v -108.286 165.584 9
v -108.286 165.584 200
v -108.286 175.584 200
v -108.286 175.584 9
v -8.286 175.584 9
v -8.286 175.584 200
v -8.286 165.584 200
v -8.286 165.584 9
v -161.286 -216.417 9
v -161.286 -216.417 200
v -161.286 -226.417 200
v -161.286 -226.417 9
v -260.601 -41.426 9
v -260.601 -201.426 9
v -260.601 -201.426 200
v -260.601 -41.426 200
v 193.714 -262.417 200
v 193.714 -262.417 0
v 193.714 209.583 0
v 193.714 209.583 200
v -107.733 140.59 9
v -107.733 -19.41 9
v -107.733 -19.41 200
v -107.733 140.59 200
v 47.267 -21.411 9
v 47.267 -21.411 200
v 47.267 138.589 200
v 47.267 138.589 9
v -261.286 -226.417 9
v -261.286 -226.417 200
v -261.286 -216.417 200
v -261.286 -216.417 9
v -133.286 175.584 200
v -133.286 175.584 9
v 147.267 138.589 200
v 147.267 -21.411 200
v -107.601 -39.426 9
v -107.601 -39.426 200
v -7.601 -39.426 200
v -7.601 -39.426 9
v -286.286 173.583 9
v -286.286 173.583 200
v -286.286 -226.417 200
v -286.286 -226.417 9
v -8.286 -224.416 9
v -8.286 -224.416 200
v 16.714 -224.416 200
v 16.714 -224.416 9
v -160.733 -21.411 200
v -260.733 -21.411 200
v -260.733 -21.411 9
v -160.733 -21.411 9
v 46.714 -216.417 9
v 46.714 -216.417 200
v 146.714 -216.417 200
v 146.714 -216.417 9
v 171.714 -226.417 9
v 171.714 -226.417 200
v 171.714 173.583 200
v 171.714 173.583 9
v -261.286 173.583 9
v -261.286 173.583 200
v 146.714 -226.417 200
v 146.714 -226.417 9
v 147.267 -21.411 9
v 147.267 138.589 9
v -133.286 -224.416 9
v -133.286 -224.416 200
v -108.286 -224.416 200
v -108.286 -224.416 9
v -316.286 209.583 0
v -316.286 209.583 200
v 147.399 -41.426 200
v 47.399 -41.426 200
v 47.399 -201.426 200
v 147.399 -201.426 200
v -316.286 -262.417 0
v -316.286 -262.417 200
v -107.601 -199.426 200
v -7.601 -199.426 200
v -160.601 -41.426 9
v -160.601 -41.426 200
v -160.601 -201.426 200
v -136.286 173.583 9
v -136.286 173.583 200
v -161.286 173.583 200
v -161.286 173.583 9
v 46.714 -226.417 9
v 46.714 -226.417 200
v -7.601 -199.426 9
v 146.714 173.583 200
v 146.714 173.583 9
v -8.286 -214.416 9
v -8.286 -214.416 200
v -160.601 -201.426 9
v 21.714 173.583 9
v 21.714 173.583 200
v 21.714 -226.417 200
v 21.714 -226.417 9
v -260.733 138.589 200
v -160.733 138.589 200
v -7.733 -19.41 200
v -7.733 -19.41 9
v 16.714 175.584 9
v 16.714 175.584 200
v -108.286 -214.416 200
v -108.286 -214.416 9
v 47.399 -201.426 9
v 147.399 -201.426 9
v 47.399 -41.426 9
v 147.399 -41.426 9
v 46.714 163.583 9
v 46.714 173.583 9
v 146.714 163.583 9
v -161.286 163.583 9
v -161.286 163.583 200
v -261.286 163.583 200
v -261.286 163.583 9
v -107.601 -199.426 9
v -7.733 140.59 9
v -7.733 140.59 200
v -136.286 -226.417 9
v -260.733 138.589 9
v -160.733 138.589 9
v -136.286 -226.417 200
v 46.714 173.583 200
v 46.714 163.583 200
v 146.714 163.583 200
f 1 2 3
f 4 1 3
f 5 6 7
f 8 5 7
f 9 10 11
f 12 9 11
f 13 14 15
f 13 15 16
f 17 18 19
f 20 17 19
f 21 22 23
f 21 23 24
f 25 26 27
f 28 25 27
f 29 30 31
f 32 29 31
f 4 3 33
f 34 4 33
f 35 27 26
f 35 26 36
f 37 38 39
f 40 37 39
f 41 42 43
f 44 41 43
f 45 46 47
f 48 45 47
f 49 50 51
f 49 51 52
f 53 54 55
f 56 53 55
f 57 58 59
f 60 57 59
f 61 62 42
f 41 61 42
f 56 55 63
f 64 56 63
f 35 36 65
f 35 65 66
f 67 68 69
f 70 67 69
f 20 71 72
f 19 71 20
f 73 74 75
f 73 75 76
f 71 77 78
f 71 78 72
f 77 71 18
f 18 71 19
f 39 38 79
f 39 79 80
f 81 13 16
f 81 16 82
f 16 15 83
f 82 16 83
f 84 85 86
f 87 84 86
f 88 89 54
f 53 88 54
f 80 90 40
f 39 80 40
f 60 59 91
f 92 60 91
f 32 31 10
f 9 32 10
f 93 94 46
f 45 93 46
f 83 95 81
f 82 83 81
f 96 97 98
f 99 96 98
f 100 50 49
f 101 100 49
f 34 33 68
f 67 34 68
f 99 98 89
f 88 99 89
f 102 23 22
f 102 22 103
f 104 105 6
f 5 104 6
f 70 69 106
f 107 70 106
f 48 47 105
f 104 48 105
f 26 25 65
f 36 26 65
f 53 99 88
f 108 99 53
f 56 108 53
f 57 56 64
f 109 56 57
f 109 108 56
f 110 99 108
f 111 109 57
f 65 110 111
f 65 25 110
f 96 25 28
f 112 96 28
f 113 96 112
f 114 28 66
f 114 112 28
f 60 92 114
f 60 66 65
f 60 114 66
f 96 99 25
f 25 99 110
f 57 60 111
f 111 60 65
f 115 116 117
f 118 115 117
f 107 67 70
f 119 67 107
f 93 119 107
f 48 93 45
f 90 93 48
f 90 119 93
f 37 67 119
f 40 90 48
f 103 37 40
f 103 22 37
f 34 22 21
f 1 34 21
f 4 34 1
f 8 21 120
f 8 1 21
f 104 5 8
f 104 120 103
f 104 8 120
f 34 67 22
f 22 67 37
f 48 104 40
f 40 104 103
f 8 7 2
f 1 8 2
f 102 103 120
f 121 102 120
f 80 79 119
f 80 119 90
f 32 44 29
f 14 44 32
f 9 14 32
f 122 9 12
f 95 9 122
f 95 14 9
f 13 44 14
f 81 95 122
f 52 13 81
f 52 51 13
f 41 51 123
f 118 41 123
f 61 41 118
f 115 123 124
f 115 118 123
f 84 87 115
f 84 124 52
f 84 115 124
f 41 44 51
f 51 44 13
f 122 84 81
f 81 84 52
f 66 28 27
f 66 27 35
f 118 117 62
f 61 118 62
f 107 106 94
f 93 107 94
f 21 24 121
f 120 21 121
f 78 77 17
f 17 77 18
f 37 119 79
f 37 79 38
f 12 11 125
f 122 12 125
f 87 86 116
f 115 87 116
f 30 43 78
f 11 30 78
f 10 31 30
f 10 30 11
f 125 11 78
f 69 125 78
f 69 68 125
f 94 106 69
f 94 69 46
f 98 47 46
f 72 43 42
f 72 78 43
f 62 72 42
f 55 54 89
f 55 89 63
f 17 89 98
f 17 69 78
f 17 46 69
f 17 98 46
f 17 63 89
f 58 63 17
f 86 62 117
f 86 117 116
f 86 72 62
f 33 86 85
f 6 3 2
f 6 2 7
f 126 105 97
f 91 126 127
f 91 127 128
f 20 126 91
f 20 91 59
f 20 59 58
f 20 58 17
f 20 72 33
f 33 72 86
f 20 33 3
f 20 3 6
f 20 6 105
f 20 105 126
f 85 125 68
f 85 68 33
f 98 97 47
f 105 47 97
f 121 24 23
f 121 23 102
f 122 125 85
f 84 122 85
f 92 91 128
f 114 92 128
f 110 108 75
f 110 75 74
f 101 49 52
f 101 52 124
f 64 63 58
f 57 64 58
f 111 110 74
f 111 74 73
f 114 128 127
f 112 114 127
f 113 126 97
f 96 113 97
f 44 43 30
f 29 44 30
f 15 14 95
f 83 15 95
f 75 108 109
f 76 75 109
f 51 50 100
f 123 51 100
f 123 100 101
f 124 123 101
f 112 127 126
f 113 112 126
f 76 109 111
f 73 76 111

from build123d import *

# Parameters (mm, degrees)
F0_W     = 510
F0_H     = 472
F1_DEPTH = 200
F2_W     = 100
F2_H     = 160
F3_DEPTH = 191
F4_W     = 100
F4_H     = 160
F5_DEPTH = 191
F6_W     = 100
F6_H     = 160
F7_DEPTH = 191


with BuildPart() as f1:
    # F0 (on Top) → F1 (new body)
    with BuildSketch(Plane.XY):
        with Locations((-61.286047, -26.417014)):
            Rectangle(F0_W, F0_H)
    extrude(amount=F1_DEPTH)

    # F2 (on face) → F3 (cut)
    with BuildSketch(Plane.XY.offset(200)):
        Polygon((-261.286047, 173.582986), (-286.286047, 173.582986), (-286.286047, -226.417014), (-261.286047, -226.417014), (-261.286047, -216.417014), (-161.286047, -216.417014), (-161.286047, -226.417014), (-136.286047, -226.417014), (-136.286047, 173.582986), (-161.286047, 173.582986), (-161.286047, 163.582986), (-261.286047, 163.582986), align=None)
        with Locations((-210.600971, -121.426403)):
            Rectangle(F2_W, F2_H, mode=Mode.SUBTRACT)
        with Locations((-210.732838, 58.589107)):
            Rectangle(F2_W, F2_H, mode=Mode.SUBTRACT)
    extrude(amount=-F3_DEPTH, mode=Mode.SUBTRACT)

    # F4 (on face) → F5 (cut)
    with BuildSketch(Plane.XY.offset(200)):
        Polygon((-108.286047, 175.583639), (-133.286047, 175.583639), (-133.286047, -224.416361), (-108.286047, -224.416361), (-108.286047, -214.416361), (-8.286047, -214.416361), (-8.286047, -224.416361), (16.713953, -224.416361), (16.713953, 175.583639), (-8.286047, 175.583639), (-8.286047, 165.583639), (-108.286047, 165.583639), align=None)
        with Locations((-57.600971, -119.425749)):
            Rectangle(F4_W, F4_H, mode=Mode.SUBTRACT)
        with Locations((-57.732838, 60.589761)):
            Rectangle(F4_W, F4_H, mode=Mode.SUBTRACT)
    extrude(amount=-F5_DEPTH, mode=Mode.SUBTRACT)

    # F6 (on face) → F7 (cut)
    with BuildSketch(Plane.XY.offset(200)):
        Polygon((46.713953, 173.582986), (21.713953, 173.582986), (21.713953, -226.417014), (46.713953, -226.417014), (46.713953, -216.417014), (146.713953, -216.417014), (146.713953, -226.417014), (171.713953, -226.417014), (171.713953, 173.582986), (146.713953, 173.582986), (146.713953, 163.582986), (46.713953, 163.582986), align=None)
        with Locations((97.399029, -121.426403)):
            Rectangle(F6_W, F6_H, mode=Mode.SUBTRACT)
        with Locations((97.267162, 58.589107)):
            Rectangle(F6_W, F6_H, mode=Mode.SUBTRACT)
    extrude(amount=-F7_DEPTH, mode=Mode.SUBTRACT)


solid = f1.part
